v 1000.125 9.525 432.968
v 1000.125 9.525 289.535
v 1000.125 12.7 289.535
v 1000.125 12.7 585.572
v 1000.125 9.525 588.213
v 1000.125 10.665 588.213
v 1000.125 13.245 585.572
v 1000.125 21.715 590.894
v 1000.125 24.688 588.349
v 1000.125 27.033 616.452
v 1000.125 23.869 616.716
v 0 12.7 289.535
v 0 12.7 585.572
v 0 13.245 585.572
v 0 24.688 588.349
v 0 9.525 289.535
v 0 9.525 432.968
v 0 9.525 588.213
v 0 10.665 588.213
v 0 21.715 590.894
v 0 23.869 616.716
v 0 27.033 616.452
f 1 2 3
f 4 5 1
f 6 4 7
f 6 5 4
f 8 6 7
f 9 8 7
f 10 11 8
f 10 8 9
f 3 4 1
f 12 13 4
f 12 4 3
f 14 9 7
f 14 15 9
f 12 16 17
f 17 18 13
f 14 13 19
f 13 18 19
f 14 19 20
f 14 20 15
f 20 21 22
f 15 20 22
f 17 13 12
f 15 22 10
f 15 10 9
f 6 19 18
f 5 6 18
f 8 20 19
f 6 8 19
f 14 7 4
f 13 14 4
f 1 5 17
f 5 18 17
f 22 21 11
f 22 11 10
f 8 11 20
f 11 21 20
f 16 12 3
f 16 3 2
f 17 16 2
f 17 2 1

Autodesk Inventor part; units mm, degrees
ref_plane "YZ Plane" through (0, 0, 0) normal (1, 0, 0) x (0, 1, 0)
ref_plane "XZ Plane" through (0, 0, 0) normal (0, 1, 0) x (-1, 0, 0)
ref_plane "XY Plane" through (0, 0, 0) normal (0, 0, 1) x (1, 0, 0)
sketch "Sketch1" plane through (0, 0, 0) normal (1, 0, 0) x (0, 1, 0)
  line L0 (0, 0) -> (0, 597.7382)
  line L1 (0, 0) -> (3.175, 0)
  line L2 (3.175, 0) -> (3.175, 594.5632)
  line L3 (3.175, 594.5632) -> (9.906, 594.5632)
  line L4 (9.906, 594.5632) -> (15.756, 595.9828)
  line L5 (0, 597.7382) -> (9.5263, 597.7382)
  line L6 (9.5263, 597.7382) -> (12.7824, 598.5283)
  line L7 (41.2921, 902.0052) -> (15.756, 595.9828)
  line L8 (12.7824, 598.5283) -> (38.1281, 902.2692)
  line L9 (38.1281, 902.2692) -> (41.2921, 902.0052)
  line L10 (41.2921, 902.0052) -> (44.4671, 901.7403)
  line L11 (44.4671, 901.7403) -> (18.7409, 593.44)
  line L12 (18.7409, 593.44) -> (10.2857, 591.3882)
  line L13 (10.2857, 591.3882) -> (6.35, 591.3882)
  line L14 (6.35, 591.3882) -> (6.35, 574.5988)
  line L15 (6.35, 574.5988) -> (3.175, 574.5988)
  line L16 (44.4671, 901.7403) -> (47.6311, 901.4763)
  line L17 (47.6311, 901.4763) -> (21.7146, 590.8944)
  line L18 (21.7146, 590.8944) -> (10.6654, 588.2132)
  line L19 (10.6654, 588.2132) -> (9.525, 588.2132)
  line L20 (9.525, 588.2132) -> (9.525, 432.9684)
  line L21 (9.525, 432.9684) -> (6.35, 432.9684)
  line L22 (6.35, 432.9684) -> (6.35, 574.5988)
  line L23 (32.5862, 759.3601) -> (35.7502, 759.0961)
  line L24 (47.6311, 901.4763) -> (50.7951, 901.2122)
  line L25 (50.7951, 901.2122) -> (24.6882, 588.3489)
  line L26 (24.6882, 588.3489) -> (13.2454, 585.5721)
  line L27 (13.2454, 585.5721) -> (12.7, 585.5721)
  line L28 (12.7, 585.5721) -> (12.7, 289.5351)
  line L29 (23.8692, 616.7159) -> (27.0332, 616.4519)
  line L30 (12.7, 289.5351) -> (9.525, 289.5351)
  line L31 (9.525, 289.5351) -> (9.525, 432.9684)
  line L32 (15.875, 582.9431) -> (20.5529, 584.0783)
  line L33 (15.875, 582.9431) -> (15.875, 573.3366)
  point P0 (14.5133, 592.4141)
  dimension "d0" = 594.5632
  dimension "d1" = 3.175
  dimension "d2" = 6.731
  dimension "d7" = 3.175
  dimension "d8" = 6.0198
  dimension "d9" = 166.36
  dimension "d10" = 3.175
  dimension "d11" = 108.41
  dimension "d12" = 3.175
  dimension "d13" = 307.086
  dimension "d18" = 3.175
  dimension "d20" = 307.1025
  dimension "d21" = 8.7006
  dimension "d22" = 3.175
  dimension "d23" = 3.175
  dimension "d24" = 3.9357
  dimension "d25" = 16.7894
  dimension "d28" = 3.175
  dimension "d29" = 3.186
  dimension "d30" = 3.175
  dimension "d32" = 3.175
  dimension "d33" = 3.175
  dimension "d34" = 142.875
  dimension "d35" = 168.7862
  dimension "d36" = 11.3698
  dimension "d37" = 1.1404
  dimension "d38" = 155.2448
  dimension "d41" = 3.175
  dimension "d42" = 3.175
  dimension "d43" = 3.175
  dimension "d44" = 142.875
  dimension "d45" = 296.037
  dimension "d46" = 28.2007
  dimension "d47" = 11.7749
  dimension "d48" = 0.5454
  dimension "d51" = 3.175
  dimension "d52" = 3.175
  dimension "d53" = 2.629
extrude "Extrusion4" add sketch "Sketch1" along normal blind 1000.125 contours L20 L19 L18 L17 L29 L25 L26 L27 L28 L30 L31
properties part number "Third_Shingle_Over_Intake_Vent_With_Length_39.375_Inches"
